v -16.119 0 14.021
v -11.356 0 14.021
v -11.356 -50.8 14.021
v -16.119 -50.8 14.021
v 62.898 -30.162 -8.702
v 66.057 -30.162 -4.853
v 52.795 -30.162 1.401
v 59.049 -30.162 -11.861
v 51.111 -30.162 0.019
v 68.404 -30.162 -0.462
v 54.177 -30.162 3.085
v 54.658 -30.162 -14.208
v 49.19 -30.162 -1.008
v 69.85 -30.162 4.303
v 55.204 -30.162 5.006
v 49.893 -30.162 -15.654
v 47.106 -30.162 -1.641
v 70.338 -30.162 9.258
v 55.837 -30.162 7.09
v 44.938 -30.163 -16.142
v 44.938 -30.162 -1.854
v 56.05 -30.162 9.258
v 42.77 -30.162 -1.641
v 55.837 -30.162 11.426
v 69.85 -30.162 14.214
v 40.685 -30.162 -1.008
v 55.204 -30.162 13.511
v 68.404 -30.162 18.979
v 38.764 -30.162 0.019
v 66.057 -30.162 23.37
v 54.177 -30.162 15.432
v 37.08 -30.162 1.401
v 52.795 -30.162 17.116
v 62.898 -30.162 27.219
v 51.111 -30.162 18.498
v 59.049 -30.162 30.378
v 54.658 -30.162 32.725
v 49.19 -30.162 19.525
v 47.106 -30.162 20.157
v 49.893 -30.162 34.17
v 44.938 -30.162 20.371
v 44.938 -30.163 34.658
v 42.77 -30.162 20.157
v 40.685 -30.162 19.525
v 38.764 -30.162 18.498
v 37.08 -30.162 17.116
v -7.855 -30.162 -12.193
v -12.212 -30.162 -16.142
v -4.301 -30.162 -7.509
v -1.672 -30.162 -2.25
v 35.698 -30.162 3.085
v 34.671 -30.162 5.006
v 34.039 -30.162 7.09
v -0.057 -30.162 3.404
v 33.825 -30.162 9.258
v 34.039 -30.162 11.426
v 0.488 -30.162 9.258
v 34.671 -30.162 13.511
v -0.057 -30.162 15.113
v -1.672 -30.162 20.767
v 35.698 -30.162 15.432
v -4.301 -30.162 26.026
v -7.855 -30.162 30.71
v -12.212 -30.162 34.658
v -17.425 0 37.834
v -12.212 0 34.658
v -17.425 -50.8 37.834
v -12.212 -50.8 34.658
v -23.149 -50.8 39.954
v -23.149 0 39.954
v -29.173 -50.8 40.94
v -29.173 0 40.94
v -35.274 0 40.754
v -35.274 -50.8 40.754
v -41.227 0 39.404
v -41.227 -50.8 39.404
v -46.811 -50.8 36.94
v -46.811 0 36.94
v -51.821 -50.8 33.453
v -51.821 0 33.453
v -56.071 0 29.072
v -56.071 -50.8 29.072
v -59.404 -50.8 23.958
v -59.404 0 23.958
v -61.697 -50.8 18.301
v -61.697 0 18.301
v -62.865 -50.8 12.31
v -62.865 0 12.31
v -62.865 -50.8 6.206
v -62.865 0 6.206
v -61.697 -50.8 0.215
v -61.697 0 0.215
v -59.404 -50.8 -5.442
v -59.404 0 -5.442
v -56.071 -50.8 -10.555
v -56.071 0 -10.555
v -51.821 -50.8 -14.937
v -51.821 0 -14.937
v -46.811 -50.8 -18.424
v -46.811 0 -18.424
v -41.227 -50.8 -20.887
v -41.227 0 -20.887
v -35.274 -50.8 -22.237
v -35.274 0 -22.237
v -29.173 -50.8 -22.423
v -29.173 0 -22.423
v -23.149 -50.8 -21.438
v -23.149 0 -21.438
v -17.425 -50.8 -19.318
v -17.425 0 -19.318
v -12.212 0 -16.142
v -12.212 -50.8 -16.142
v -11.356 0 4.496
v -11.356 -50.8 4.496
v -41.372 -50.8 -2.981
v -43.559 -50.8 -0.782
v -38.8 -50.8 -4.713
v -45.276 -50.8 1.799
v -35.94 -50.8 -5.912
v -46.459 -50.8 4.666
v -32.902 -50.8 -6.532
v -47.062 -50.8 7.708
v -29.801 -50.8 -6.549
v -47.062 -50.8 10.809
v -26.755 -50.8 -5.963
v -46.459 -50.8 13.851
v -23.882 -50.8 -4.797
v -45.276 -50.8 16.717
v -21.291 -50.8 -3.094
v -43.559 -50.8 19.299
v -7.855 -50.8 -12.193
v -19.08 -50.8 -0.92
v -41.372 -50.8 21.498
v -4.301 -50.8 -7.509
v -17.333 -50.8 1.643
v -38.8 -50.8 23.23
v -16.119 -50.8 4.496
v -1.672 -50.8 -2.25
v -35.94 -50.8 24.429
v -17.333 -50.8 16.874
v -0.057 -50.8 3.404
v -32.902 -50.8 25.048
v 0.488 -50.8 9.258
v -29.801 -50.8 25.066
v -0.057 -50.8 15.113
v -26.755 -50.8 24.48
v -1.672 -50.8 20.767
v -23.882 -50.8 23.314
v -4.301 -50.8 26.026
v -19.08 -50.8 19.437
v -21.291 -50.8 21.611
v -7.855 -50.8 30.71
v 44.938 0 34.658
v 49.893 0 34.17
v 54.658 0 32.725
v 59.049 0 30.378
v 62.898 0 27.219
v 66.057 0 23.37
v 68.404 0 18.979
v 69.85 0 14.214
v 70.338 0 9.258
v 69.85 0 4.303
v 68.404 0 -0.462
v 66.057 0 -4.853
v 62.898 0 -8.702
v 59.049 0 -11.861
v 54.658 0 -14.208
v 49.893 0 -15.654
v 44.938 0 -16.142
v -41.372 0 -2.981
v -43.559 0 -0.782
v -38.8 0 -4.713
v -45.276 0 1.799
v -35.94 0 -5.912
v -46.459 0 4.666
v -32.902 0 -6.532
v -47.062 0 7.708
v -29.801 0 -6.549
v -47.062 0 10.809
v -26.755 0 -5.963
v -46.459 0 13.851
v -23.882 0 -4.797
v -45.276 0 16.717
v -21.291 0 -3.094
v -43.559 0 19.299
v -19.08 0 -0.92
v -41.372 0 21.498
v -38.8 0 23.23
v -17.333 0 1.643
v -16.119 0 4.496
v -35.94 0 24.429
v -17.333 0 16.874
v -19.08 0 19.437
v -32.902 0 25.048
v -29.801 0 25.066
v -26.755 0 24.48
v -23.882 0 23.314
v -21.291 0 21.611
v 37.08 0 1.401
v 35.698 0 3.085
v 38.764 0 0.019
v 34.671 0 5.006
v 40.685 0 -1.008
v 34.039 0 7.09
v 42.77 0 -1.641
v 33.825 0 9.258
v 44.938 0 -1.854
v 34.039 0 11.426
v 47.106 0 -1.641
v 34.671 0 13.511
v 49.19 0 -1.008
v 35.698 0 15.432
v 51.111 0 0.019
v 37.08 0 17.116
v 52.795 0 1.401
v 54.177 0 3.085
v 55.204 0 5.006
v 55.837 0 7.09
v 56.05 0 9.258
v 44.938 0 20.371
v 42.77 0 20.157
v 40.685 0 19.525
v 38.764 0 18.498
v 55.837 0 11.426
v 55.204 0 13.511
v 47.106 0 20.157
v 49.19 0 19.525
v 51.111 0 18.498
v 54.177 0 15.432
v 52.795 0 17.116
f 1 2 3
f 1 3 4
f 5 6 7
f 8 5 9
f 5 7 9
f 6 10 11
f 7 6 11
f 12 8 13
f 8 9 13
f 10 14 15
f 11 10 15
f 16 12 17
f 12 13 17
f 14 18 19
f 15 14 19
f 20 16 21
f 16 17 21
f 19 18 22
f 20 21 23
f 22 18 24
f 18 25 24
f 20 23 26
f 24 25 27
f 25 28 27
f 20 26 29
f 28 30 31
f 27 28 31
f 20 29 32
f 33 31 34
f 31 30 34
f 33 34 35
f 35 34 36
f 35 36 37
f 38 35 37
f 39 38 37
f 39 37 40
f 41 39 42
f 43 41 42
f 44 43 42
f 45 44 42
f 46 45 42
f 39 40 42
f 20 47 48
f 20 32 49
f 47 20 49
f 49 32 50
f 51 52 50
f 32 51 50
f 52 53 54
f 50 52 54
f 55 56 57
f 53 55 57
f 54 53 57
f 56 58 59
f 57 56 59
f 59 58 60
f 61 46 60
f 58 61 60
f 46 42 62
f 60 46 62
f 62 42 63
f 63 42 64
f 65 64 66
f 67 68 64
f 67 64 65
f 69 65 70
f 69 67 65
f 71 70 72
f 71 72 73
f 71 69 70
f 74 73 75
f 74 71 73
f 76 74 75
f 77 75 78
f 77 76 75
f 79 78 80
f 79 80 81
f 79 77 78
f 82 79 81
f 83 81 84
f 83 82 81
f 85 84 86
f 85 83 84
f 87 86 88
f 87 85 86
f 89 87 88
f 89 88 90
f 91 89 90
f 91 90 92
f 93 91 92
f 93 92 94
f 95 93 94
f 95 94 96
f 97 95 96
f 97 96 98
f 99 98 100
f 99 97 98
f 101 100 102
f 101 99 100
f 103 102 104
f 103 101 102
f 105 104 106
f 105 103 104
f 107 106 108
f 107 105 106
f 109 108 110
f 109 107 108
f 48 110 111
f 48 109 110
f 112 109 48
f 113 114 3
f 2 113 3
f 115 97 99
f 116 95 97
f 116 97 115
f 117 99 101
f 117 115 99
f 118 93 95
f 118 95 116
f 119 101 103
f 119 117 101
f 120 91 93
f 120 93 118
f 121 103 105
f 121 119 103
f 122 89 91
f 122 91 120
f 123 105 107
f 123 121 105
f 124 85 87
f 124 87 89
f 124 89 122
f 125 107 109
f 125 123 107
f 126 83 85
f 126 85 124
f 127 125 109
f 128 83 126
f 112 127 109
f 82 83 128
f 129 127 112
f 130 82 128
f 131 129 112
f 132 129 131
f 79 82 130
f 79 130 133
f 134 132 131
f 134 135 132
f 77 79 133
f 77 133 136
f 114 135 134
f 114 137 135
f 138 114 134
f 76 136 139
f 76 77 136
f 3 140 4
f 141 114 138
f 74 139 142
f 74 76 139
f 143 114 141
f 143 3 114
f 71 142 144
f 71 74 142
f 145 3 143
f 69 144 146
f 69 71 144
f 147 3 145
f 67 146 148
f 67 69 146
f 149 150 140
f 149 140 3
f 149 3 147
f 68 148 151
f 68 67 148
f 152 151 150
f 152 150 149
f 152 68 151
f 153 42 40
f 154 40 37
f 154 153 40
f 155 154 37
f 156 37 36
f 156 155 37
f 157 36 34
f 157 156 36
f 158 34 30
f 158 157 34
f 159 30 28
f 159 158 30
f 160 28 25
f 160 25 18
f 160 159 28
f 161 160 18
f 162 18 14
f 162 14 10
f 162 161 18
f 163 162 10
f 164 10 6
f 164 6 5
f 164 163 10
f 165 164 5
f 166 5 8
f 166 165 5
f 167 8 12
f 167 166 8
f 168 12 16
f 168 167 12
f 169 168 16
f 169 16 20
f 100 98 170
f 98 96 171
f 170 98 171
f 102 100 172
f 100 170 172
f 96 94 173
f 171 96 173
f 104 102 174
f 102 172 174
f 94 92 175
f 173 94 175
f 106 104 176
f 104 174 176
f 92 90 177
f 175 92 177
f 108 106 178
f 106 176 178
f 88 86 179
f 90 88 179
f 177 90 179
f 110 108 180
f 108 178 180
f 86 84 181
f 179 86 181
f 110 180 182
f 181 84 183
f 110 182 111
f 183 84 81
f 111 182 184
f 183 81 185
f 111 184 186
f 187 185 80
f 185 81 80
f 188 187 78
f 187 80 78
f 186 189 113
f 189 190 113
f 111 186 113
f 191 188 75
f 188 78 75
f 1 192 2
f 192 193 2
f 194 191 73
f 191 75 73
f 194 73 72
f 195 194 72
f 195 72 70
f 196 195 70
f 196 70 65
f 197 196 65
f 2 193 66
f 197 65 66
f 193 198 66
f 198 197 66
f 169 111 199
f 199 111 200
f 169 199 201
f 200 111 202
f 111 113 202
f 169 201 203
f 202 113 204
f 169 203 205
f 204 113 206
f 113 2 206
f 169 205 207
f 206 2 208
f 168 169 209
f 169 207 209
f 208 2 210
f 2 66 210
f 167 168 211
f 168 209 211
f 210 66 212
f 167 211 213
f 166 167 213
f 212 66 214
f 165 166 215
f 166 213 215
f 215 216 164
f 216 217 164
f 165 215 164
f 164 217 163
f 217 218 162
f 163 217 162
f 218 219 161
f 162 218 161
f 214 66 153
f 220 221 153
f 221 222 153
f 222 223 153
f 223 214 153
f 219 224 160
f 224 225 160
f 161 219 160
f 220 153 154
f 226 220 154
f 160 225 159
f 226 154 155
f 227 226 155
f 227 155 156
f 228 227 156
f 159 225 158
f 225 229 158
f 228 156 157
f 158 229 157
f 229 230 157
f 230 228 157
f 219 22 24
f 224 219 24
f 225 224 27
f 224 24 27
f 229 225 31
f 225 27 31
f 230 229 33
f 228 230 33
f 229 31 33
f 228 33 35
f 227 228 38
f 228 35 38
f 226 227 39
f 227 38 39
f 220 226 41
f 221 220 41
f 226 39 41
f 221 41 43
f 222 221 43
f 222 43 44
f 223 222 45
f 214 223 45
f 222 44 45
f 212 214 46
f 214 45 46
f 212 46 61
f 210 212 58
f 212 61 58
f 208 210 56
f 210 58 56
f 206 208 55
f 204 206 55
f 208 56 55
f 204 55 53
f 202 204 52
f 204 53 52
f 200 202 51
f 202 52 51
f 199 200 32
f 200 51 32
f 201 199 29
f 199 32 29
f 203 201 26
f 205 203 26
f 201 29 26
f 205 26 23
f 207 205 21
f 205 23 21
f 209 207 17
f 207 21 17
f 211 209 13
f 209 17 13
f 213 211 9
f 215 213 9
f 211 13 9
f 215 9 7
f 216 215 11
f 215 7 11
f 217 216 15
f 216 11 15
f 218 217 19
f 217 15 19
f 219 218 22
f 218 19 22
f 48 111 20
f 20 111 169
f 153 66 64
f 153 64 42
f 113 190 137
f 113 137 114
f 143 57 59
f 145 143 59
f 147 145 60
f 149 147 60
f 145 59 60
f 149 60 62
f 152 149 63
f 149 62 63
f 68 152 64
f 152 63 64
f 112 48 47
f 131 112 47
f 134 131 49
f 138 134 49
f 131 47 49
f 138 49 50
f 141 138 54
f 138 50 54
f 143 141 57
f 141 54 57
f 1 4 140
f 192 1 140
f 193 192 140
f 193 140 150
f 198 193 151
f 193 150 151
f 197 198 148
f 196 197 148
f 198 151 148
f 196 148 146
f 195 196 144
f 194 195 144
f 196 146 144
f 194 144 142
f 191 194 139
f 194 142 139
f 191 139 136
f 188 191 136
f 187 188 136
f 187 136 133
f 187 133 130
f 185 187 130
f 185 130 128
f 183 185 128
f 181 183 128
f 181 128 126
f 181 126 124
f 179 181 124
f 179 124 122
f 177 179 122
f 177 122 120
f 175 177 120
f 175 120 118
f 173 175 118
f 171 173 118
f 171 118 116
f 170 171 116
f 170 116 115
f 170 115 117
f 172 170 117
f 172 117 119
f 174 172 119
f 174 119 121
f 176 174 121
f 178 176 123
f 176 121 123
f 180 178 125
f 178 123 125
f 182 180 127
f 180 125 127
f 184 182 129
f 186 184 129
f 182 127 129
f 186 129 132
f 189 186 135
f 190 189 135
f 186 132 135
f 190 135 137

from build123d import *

# Parameters (mm, degrees)
F0_W      = 76.2
F0_H      = 50.8
F1_DEPTH  = 30.1625
F3_DEPTH  = 30.1625
F4_R      = 11.1125
F5_DEPTH  = 30.1625
F7_DEPTH  = 20.6375
F8_DEPTH  = 30.1625
F9_R      = 15.875
F10_DEPTH = 50.8
F12_DEPTH = 50.8


with BuildPart() as f1:
    # F0 (on Front) → F1 (new body)
    with BuildSketch(Plane.XZ):
        with Locations((6.8375896662, 9.2583434884)):
            Rectangle(F0_W, F0_H)
    extrude(amount=F1_DEPTH)

    # F2 (on face) → F3 (join)
    with BuildSketch(Plane(origin=(0, 0, 0), x_dir=(-1, 0, 0), z_dir=(0, 1, 0))):
        with BuildLine():
            Line((-44.9375896662, -16.1416565116), (-44.9375896662, 34.6583434884))
            ThreePointArc((-44.9375896662, 34.6583434884), (-70.3375896662, 9.2583434884), (-44.9375896662, -16.1416565116))
        make_face()
    extrude(amount=-F3_DEPTH)

    # F4 (on face) → F5 (cut)
    with BuildSketch(Plane.XZ.offset(30.1625)):
        with Locations((44.9375896662, 9.2583434884)):
            Circle(F4_R)
    extrude(amount=-F5_DEPTH, mode=Mode.SUBTRACT)

    # F6 (on face) → F7 (join)
    with BuildSketch(Plane.XZ.offset(30.1625)):
        with BuildLine():
            Line((-31.2624103338, 34.6583434884), (-12.2124103338, 34.6583434884))
            ThreePointArc((-12.2124103338, 34.6583434884), (-63.0124103338, 9.2583434884), (-12.2124103338, -16.1416565116))
            Line((-12.2124103338, -16.1416565116), (-31.2624103338, -16.1416565116))
            Line((-31.2624103338, -16.1416565116), (-31.2624103338, 34.6583434884))
        make_face()
        with BuildLine():
            ThreePointArc((-12.2124103338, -16.1416565116), (-2.8643470195, -4.9406881687), (0.4875896662, 9.2583434884))
            ThreePointArc((0.4875896662, 9.2583434884), (-2.8643470195, 23.4573751456), (-12.2124103338, 34.6583434884))
            Line((-12.2124103338, 34.6583434884), (-31.2624103338, 34.6583434884))
            Line((-31.2624103338, 34.6583434884), (-31.2624103338, -16.1416565116))
            Line((-31.2624103338, -16.1416565116), (-12.2124103338, -16.1416565116))
        make_face()
    extrude(amount=F7_DEPTH)

    # F8 (add): a face of the model
    f8_faces = [f1.faces().sort_by_distance(p)[0] for p in [
        (-42.7836943553, -30.1625, 9.2583434884),
    ]]
    extrude(f8_faces, amount=F8_DEPTH)

    # F9 (on face) → F10 (cut)
    with BuildSketch(Plane.XZ.offset(50.8)):
        with Locations((-31.2624103338, 9.2583434884)):
            Circle(F9_R)
    extrude(amount=-F10_DEPTH, mode=Mode.SUBTRACT)

    # F11 (on face) → F12 (cut)
    with BuildSketch(Plane.XZ.offset(50.8)):
        with BuildLine():
            Line((-11.3561255113, 14.0208434884), (-16.1186255113, 14.0208434884))
            ThreePointArc((-16.1186255113, 14.0208434884), (-15.5712789364, 11.6674969645), (-15.3874103338, 9.2583434884))
            ThreePointArc((-15.3874103338, 9.2583434884), (-15.5712789364, 6.8491900123), (-16.1186255113, 4.4958434884))
            Line((-16.1186255113, 4.4958434884), (-11.3561255113, 4.4958434884))
            Line((-11.3561255113, 4.4958434884), (-11.3561255113, 14.0208434884))
        make_face()
    extrude(amount=-F12_DEPTH, mode=Mode.SUBTRACT)


solid = f1.part
